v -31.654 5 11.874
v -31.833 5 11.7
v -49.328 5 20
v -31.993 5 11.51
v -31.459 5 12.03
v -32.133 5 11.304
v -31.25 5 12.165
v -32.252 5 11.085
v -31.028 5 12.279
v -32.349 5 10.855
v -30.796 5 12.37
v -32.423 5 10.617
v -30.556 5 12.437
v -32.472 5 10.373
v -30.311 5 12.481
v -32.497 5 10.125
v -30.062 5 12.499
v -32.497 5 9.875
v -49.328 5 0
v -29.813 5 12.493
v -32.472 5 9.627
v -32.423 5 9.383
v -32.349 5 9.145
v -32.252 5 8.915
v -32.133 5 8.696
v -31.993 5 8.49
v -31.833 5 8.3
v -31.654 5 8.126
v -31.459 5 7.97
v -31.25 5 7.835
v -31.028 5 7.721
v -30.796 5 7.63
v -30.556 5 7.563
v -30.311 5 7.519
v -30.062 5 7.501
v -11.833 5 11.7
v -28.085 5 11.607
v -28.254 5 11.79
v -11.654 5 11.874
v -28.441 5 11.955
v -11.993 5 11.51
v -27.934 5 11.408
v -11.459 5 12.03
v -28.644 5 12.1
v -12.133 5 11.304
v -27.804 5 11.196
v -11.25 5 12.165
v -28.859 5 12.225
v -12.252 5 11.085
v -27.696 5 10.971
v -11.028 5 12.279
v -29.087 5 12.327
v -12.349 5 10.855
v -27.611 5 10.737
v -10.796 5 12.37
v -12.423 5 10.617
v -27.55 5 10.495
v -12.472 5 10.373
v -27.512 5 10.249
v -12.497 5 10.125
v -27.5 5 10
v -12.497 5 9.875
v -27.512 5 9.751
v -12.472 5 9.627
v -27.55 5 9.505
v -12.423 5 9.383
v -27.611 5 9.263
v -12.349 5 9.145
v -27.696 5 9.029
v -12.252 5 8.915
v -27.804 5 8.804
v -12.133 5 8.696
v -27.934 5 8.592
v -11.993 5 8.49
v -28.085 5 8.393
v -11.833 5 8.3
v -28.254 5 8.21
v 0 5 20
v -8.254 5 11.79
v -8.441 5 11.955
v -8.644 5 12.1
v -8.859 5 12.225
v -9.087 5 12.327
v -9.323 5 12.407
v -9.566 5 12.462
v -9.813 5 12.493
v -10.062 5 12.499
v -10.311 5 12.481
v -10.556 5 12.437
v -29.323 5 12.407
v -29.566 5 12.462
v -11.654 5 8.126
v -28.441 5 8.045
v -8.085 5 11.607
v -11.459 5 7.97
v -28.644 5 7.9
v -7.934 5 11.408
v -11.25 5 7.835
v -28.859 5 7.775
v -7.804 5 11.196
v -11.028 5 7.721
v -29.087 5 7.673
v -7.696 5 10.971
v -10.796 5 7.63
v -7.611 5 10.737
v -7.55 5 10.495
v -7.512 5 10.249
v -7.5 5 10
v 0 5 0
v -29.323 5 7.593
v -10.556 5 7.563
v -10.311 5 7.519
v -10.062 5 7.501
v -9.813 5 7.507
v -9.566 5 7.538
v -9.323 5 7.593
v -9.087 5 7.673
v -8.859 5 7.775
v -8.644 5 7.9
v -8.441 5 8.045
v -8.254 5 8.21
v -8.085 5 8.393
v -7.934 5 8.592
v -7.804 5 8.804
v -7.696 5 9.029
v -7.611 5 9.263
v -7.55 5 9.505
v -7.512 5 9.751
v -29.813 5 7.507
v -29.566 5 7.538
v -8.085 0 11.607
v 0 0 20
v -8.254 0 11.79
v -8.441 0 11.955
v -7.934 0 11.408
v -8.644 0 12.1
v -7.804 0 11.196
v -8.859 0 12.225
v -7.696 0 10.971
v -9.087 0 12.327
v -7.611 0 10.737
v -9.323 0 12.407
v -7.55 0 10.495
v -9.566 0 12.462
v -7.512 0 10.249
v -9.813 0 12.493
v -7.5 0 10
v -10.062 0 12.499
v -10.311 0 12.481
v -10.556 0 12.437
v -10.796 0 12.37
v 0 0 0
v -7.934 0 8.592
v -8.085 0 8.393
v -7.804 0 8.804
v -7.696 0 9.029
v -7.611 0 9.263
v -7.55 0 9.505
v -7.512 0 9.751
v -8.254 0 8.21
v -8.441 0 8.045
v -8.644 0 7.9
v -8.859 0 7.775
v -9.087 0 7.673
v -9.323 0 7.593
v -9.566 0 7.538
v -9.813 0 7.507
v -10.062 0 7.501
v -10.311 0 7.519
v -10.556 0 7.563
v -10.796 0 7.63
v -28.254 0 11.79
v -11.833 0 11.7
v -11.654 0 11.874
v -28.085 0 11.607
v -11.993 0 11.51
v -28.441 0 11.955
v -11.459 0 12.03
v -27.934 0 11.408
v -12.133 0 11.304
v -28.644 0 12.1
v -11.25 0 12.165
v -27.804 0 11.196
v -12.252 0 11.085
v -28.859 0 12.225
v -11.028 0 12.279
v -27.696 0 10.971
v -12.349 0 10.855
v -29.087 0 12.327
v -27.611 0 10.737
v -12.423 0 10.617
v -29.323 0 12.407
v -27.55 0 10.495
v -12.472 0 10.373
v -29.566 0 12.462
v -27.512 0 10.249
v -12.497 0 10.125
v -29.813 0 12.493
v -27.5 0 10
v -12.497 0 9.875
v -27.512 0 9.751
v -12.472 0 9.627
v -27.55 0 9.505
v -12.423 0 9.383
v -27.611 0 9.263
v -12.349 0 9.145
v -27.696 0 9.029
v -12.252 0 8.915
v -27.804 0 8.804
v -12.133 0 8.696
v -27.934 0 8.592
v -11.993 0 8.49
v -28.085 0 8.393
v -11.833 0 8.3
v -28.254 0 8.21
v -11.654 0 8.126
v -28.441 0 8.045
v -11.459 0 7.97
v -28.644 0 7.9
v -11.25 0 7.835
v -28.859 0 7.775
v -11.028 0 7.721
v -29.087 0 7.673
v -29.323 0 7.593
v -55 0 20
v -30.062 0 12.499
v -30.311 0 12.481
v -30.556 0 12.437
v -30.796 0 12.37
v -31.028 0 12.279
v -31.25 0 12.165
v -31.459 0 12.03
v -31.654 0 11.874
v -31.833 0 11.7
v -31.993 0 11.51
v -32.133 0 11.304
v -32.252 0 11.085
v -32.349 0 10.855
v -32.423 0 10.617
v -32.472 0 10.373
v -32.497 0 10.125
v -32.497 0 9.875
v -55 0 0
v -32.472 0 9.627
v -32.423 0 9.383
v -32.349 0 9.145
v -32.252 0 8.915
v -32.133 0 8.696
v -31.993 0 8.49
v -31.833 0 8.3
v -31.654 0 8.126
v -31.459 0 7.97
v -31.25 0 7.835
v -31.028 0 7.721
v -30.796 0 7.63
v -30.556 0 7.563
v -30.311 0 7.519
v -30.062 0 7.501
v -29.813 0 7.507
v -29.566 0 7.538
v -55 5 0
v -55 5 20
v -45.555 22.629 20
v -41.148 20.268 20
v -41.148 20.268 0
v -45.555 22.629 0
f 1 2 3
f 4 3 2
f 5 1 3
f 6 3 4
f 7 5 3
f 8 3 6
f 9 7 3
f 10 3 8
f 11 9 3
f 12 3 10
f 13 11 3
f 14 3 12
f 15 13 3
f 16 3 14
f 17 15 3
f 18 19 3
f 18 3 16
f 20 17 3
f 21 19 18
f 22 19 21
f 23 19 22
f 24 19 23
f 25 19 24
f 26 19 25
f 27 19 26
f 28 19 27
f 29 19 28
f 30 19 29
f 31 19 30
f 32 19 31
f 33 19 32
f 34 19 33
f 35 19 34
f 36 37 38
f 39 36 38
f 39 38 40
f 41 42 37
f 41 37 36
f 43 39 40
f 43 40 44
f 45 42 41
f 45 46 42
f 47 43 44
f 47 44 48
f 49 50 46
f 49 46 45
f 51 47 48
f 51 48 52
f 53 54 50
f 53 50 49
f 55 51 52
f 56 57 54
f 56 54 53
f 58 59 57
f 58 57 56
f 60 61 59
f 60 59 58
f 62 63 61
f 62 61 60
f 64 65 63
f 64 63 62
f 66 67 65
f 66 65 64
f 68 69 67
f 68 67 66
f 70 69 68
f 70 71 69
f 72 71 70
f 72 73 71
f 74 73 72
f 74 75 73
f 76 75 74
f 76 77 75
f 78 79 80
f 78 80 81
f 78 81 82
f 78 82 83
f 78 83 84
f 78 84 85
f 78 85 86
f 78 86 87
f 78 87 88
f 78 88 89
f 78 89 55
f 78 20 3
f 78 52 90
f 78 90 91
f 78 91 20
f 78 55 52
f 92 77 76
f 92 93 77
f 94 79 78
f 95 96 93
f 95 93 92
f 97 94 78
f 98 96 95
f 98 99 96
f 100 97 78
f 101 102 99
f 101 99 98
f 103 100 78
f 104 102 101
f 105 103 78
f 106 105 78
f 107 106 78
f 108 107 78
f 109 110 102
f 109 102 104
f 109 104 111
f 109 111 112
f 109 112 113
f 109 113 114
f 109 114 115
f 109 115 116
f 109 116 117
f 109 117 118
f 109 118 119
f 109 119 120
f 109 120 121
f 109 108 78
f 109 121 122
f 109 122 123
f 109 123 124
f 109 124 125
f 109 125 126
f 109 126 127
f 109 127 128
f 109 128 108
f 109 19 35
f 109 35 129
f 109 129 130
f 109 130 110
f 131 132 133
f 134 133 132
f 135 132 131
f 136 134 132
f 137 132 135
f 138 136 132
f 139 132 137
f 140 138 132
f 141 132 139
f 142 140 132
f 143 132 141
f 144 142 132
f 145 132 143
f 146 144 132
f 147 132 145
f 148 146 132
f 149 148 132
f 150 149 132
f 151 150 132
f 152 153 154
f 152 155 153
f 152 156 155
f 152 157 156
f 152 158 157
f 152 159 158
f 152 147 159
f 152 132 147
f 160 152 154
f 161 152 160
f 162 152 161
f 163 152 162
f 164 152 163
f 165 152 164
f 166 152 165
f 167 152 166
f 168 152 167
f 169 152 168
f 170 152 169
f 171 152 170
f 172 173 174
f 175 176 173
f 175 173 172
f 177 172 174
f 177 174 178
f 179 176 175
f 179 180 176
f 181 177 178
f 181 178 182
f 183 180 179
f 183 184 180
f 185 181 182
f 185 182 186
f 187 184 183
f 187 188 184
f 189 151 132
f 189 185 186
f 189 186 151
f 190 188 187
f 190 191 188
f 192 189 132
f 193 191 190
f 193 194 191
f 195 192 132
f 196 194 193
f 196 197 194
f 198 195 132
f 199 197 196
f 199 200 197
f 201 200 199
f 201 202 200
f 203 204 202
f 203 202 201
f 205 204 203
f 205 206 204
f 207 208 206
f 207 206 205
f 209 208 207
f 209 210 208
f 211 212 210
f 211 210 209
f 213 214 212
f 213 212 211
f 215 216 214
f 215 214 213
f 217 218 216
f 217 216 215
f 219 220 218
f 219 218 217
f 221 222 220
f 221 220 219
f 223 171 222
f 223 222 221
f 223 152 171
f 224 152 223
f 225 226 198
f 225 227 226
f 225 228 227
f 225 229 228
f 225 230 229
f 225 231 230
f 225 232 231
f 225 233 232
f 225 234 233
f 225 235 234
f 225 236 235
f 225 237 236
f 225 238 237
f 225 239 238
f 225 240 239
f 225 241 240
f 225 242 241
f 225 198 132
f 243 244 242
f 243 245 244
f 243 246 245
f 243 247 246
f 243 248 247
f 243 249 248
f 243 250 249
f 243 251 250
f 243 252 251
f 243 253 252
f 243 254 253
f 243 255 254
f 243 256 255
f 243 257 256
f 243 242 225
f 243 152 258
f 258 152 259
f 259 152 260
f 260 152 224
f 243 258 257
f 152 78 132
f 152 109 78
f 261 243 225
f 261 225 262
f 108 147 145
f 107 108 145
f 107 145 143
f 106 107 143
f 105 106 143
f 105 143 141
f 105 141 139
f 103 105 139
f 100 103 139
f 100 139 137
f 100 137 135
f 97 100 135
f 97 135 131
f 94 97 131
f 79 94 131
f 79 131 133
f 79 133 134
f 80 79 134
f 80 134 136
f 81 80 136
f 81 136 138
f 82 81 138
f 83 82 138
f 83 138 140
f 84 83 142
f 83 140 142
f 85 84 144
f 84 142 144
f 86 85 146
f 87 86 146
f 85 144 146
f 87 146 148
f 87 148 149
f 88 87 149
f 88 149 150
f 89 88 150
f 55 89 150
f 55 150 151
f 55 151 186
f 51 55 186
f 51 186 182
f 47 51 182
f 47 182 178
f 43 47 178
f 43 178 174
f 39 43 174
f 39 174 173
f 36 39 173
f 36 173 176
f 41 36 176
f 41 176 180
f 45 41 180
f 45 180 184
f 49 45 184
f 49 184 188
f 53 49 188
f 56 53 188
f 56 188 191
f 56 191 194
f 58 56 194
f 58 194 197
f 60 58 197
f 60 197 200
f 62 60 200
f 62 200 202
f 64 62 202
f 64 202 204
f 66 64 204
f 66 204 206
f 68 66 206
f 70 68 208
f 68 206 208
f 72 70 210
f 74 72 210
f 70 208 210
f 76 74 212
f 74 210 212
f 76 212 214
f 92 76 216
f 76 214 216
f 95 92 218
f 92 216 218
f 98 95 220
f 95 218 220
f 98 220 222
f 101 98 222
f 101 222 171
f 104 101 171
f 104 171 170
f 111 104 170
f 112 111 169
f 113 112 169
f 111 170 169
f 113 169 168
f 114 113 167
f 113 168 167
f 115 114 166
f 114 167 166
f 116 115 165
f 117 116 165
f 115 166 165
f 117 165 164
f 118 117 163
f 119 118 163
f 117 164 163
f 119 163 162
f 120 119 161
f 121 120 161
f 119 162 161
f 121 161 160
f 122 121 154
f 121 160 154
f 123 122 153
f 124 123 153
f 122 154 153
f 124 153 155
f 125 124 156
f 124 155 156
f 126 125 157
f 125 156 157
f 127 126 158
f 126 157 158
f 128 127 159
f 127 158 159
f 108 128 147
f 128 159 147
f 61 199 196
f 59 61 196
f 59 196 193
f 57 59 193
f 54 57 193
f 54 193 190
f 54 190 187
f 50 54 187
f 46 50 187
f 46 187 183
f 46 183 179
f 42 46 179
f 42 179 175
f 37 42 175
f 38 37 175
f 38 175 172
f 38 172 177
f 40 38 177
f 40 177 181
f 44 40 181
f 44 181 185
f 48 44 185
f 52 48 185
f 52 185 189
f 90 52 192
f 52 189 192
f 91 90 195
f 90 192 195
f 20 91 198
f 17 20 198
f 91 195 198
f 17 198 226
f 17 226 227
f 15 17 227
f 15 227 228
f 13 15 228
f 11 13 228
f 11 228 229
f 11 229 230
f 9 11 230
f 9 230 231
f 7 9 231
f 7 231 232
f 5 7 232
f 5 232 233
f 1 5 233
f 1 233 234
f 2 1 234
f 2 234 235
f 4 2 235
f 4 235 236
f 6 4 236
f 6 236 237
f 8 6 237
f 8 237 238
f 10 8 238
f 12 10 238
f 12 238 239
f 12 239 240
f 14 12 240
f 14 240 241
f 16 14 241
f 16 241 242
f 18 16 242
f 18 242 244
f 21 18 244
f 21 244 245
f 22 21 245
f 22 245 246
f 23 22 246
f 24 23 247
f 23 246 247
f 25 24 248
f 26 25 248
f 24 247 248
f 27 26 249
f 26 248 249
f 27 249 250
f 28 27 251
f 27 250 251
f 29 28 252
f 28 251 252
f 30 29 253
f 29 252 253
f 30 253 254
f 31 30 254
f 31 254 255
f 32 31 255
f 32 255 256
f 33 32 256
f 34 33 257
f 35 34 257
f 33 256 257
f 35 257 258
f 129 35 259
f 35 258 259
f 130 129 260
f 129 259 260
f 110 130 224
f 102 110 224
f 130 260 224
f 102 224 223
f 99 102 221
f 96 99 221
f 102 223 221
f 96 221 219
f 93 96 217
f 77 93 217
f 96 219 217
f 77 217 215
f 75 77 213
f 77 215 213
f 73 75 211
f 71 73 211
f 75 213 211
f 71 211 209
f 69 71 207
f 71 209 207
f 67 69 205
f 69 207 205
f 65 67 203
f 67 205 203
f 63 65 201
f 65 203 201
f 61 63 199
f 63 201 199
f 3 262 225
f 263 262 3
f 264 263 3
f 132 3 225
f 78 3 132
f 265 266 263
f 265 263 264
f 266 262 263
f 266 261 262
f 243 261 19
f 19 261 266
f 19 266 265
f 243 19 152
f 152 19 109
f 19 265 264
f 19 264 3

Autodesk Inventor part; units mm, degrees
ref_plane "YZ Plane" through (0, 0, 0) normal (1, 0, 0) x (0, 1, 0)
ref_plane "XZ Plane" through (0, 0, 0) normal (0, 1, 0) x (-1, 0, 0)
ref_plane "XY Plane" through (0, 0, 0) normal (0, 0, 1) x (1, 0, 0)
sketch "スケッチ1" plane through (0, 0, 0) normal (0, 0, 1) x (1, 0, 0)
  line L0 (0, 0) -> (-55, 0)
  line L1 (-55, 0) -> (-55, 5)
  line L2 (-55, 5) -> (-45.5551, 22.6294)
  line L3 (-45.5551, 22.6294) -> (-41.1478, 20.2682)
  line L4 (-41.1478, 20.2682) -> (-49.3276, 5)
  line L5 (-49.3276, 5) -> (0, 5)
  line L6 (0, 5) -> (0, 0)
  dimension "d0" = 61.82
  dimension "d1" = 55
  dimension "d2" = 5
  dimension "d3" = 5
  dimension "d4" = 20
extrude "押し出し1" add sketch "スケッチ1" along normal blind 20
sketch "スケッチ2" plane through (-55, 0, 0) normal (0, -1, 0) x (1, 0, 0)
  line L0 (55, 0) -> (55, 20) projected
  line L1 (55, 10) -> (45, 10) construction
  circle A0 centre (45, 10) radius 2.5
  circle A1 centre (25, 10) radius 2.5
  dimension "d7" = 5
  dimension "d8" = 10
  dimension "d11" = 20
extrude "押し出し2" cut sketch "スケッチ2" against normal up to next
properties part number "防水5_3D プリント"
